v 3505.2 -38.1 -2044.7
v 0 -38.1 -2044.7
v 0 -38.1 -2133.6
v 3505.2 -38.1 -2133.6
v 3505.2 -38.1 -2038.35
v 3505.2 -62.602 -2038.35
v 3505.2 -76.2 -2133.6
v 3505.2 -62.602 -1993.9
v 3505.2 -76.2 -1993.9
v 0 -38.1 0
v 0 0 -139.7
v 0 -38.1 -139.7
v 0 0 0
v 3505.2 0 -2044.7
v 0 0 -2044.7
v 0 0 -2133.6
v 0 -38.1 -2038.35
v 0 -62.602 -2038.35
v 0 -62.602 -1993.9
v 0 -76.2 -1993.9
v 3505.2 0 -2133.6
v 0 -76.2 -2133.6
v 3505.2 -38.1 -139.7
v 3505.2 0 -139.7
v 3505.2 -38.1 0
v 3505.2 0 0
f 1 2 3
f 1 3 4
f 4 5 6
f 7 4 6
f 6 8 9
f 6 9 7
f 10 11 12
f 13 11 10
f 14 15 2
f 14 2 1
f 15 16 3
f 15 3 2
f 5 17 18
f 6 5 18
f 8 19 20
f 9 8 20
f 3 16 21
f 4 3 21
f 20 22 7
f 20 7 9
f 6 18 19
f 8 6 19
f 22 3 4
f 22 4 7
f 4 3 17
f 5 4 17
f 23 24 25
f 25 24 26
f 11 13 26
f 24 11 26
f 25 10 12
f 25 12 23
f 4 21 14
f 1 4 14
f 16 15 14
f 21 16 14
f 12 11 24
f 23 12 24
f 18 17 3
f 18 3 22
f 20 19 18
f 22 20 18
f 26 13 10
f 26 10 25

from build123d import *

# Parameters (mm, degrees)
F0_W     = 3505.2
F0_H     = 139.7
F1_DEPTH = 38.1
F0_H_2   = 88.9
F2_W     = 38.1
F2_H     = 139.7
F3_DEPTH = 3505.2
F4_W     = 62.6018452736
F4_H     = 44.45
F5_DEPTH = 3505.2


# Not quite as in the source:
# - a feature names something its author has since deleted; it is built from what else it names


with BuildPart() as f1:
    # F0 (on Front) → F1 (new body)
    with BuildSketch(Plane.XZ):
        with Locations((1752.6, -69.85)):
            Rectangle(F0_W, F0_H)
    extrude(amount=F1_DEPTH)


with BuildPart() as f1b:
    # F0 (on Front) → F1, piece 2 (new body)
    with BuildSketch(Plane.XZ):
        with Locations((1752.6, -2089.15)):
            Rectangle(F0_W, F0_H_2)
    extrude(amount=F1_DEPTH)


with BuildPart() as f3:
    # F2 (on face) → F3 (new body, through all)
    with BuildSketch(Plane(origin=(0, 0, 0), x_dir=(0, -1, 0), z_dir=(-1, 0, 0))):
        with Locations((57.15, -2063.75)):
            Rectangle(F2_W, F2_H)
    extrude(amount=-F3_DEPTH)

    # F4 (on face) → F5 (cut, through all)
    with BuildSketch(Plane(origin=(0, 0, 0), x_dir=(0, -1, 0), z_dir=(-1, 0, 0))):
        with Locations((31.3009226368, -2016.125)):
            Rectangle(F4_W, F4_H)
    extrude(amount=-F5_DEPTH, mode=Mode.SUBTRACT)


solid = Compound([f1.part, f1b.part, f3.part])
